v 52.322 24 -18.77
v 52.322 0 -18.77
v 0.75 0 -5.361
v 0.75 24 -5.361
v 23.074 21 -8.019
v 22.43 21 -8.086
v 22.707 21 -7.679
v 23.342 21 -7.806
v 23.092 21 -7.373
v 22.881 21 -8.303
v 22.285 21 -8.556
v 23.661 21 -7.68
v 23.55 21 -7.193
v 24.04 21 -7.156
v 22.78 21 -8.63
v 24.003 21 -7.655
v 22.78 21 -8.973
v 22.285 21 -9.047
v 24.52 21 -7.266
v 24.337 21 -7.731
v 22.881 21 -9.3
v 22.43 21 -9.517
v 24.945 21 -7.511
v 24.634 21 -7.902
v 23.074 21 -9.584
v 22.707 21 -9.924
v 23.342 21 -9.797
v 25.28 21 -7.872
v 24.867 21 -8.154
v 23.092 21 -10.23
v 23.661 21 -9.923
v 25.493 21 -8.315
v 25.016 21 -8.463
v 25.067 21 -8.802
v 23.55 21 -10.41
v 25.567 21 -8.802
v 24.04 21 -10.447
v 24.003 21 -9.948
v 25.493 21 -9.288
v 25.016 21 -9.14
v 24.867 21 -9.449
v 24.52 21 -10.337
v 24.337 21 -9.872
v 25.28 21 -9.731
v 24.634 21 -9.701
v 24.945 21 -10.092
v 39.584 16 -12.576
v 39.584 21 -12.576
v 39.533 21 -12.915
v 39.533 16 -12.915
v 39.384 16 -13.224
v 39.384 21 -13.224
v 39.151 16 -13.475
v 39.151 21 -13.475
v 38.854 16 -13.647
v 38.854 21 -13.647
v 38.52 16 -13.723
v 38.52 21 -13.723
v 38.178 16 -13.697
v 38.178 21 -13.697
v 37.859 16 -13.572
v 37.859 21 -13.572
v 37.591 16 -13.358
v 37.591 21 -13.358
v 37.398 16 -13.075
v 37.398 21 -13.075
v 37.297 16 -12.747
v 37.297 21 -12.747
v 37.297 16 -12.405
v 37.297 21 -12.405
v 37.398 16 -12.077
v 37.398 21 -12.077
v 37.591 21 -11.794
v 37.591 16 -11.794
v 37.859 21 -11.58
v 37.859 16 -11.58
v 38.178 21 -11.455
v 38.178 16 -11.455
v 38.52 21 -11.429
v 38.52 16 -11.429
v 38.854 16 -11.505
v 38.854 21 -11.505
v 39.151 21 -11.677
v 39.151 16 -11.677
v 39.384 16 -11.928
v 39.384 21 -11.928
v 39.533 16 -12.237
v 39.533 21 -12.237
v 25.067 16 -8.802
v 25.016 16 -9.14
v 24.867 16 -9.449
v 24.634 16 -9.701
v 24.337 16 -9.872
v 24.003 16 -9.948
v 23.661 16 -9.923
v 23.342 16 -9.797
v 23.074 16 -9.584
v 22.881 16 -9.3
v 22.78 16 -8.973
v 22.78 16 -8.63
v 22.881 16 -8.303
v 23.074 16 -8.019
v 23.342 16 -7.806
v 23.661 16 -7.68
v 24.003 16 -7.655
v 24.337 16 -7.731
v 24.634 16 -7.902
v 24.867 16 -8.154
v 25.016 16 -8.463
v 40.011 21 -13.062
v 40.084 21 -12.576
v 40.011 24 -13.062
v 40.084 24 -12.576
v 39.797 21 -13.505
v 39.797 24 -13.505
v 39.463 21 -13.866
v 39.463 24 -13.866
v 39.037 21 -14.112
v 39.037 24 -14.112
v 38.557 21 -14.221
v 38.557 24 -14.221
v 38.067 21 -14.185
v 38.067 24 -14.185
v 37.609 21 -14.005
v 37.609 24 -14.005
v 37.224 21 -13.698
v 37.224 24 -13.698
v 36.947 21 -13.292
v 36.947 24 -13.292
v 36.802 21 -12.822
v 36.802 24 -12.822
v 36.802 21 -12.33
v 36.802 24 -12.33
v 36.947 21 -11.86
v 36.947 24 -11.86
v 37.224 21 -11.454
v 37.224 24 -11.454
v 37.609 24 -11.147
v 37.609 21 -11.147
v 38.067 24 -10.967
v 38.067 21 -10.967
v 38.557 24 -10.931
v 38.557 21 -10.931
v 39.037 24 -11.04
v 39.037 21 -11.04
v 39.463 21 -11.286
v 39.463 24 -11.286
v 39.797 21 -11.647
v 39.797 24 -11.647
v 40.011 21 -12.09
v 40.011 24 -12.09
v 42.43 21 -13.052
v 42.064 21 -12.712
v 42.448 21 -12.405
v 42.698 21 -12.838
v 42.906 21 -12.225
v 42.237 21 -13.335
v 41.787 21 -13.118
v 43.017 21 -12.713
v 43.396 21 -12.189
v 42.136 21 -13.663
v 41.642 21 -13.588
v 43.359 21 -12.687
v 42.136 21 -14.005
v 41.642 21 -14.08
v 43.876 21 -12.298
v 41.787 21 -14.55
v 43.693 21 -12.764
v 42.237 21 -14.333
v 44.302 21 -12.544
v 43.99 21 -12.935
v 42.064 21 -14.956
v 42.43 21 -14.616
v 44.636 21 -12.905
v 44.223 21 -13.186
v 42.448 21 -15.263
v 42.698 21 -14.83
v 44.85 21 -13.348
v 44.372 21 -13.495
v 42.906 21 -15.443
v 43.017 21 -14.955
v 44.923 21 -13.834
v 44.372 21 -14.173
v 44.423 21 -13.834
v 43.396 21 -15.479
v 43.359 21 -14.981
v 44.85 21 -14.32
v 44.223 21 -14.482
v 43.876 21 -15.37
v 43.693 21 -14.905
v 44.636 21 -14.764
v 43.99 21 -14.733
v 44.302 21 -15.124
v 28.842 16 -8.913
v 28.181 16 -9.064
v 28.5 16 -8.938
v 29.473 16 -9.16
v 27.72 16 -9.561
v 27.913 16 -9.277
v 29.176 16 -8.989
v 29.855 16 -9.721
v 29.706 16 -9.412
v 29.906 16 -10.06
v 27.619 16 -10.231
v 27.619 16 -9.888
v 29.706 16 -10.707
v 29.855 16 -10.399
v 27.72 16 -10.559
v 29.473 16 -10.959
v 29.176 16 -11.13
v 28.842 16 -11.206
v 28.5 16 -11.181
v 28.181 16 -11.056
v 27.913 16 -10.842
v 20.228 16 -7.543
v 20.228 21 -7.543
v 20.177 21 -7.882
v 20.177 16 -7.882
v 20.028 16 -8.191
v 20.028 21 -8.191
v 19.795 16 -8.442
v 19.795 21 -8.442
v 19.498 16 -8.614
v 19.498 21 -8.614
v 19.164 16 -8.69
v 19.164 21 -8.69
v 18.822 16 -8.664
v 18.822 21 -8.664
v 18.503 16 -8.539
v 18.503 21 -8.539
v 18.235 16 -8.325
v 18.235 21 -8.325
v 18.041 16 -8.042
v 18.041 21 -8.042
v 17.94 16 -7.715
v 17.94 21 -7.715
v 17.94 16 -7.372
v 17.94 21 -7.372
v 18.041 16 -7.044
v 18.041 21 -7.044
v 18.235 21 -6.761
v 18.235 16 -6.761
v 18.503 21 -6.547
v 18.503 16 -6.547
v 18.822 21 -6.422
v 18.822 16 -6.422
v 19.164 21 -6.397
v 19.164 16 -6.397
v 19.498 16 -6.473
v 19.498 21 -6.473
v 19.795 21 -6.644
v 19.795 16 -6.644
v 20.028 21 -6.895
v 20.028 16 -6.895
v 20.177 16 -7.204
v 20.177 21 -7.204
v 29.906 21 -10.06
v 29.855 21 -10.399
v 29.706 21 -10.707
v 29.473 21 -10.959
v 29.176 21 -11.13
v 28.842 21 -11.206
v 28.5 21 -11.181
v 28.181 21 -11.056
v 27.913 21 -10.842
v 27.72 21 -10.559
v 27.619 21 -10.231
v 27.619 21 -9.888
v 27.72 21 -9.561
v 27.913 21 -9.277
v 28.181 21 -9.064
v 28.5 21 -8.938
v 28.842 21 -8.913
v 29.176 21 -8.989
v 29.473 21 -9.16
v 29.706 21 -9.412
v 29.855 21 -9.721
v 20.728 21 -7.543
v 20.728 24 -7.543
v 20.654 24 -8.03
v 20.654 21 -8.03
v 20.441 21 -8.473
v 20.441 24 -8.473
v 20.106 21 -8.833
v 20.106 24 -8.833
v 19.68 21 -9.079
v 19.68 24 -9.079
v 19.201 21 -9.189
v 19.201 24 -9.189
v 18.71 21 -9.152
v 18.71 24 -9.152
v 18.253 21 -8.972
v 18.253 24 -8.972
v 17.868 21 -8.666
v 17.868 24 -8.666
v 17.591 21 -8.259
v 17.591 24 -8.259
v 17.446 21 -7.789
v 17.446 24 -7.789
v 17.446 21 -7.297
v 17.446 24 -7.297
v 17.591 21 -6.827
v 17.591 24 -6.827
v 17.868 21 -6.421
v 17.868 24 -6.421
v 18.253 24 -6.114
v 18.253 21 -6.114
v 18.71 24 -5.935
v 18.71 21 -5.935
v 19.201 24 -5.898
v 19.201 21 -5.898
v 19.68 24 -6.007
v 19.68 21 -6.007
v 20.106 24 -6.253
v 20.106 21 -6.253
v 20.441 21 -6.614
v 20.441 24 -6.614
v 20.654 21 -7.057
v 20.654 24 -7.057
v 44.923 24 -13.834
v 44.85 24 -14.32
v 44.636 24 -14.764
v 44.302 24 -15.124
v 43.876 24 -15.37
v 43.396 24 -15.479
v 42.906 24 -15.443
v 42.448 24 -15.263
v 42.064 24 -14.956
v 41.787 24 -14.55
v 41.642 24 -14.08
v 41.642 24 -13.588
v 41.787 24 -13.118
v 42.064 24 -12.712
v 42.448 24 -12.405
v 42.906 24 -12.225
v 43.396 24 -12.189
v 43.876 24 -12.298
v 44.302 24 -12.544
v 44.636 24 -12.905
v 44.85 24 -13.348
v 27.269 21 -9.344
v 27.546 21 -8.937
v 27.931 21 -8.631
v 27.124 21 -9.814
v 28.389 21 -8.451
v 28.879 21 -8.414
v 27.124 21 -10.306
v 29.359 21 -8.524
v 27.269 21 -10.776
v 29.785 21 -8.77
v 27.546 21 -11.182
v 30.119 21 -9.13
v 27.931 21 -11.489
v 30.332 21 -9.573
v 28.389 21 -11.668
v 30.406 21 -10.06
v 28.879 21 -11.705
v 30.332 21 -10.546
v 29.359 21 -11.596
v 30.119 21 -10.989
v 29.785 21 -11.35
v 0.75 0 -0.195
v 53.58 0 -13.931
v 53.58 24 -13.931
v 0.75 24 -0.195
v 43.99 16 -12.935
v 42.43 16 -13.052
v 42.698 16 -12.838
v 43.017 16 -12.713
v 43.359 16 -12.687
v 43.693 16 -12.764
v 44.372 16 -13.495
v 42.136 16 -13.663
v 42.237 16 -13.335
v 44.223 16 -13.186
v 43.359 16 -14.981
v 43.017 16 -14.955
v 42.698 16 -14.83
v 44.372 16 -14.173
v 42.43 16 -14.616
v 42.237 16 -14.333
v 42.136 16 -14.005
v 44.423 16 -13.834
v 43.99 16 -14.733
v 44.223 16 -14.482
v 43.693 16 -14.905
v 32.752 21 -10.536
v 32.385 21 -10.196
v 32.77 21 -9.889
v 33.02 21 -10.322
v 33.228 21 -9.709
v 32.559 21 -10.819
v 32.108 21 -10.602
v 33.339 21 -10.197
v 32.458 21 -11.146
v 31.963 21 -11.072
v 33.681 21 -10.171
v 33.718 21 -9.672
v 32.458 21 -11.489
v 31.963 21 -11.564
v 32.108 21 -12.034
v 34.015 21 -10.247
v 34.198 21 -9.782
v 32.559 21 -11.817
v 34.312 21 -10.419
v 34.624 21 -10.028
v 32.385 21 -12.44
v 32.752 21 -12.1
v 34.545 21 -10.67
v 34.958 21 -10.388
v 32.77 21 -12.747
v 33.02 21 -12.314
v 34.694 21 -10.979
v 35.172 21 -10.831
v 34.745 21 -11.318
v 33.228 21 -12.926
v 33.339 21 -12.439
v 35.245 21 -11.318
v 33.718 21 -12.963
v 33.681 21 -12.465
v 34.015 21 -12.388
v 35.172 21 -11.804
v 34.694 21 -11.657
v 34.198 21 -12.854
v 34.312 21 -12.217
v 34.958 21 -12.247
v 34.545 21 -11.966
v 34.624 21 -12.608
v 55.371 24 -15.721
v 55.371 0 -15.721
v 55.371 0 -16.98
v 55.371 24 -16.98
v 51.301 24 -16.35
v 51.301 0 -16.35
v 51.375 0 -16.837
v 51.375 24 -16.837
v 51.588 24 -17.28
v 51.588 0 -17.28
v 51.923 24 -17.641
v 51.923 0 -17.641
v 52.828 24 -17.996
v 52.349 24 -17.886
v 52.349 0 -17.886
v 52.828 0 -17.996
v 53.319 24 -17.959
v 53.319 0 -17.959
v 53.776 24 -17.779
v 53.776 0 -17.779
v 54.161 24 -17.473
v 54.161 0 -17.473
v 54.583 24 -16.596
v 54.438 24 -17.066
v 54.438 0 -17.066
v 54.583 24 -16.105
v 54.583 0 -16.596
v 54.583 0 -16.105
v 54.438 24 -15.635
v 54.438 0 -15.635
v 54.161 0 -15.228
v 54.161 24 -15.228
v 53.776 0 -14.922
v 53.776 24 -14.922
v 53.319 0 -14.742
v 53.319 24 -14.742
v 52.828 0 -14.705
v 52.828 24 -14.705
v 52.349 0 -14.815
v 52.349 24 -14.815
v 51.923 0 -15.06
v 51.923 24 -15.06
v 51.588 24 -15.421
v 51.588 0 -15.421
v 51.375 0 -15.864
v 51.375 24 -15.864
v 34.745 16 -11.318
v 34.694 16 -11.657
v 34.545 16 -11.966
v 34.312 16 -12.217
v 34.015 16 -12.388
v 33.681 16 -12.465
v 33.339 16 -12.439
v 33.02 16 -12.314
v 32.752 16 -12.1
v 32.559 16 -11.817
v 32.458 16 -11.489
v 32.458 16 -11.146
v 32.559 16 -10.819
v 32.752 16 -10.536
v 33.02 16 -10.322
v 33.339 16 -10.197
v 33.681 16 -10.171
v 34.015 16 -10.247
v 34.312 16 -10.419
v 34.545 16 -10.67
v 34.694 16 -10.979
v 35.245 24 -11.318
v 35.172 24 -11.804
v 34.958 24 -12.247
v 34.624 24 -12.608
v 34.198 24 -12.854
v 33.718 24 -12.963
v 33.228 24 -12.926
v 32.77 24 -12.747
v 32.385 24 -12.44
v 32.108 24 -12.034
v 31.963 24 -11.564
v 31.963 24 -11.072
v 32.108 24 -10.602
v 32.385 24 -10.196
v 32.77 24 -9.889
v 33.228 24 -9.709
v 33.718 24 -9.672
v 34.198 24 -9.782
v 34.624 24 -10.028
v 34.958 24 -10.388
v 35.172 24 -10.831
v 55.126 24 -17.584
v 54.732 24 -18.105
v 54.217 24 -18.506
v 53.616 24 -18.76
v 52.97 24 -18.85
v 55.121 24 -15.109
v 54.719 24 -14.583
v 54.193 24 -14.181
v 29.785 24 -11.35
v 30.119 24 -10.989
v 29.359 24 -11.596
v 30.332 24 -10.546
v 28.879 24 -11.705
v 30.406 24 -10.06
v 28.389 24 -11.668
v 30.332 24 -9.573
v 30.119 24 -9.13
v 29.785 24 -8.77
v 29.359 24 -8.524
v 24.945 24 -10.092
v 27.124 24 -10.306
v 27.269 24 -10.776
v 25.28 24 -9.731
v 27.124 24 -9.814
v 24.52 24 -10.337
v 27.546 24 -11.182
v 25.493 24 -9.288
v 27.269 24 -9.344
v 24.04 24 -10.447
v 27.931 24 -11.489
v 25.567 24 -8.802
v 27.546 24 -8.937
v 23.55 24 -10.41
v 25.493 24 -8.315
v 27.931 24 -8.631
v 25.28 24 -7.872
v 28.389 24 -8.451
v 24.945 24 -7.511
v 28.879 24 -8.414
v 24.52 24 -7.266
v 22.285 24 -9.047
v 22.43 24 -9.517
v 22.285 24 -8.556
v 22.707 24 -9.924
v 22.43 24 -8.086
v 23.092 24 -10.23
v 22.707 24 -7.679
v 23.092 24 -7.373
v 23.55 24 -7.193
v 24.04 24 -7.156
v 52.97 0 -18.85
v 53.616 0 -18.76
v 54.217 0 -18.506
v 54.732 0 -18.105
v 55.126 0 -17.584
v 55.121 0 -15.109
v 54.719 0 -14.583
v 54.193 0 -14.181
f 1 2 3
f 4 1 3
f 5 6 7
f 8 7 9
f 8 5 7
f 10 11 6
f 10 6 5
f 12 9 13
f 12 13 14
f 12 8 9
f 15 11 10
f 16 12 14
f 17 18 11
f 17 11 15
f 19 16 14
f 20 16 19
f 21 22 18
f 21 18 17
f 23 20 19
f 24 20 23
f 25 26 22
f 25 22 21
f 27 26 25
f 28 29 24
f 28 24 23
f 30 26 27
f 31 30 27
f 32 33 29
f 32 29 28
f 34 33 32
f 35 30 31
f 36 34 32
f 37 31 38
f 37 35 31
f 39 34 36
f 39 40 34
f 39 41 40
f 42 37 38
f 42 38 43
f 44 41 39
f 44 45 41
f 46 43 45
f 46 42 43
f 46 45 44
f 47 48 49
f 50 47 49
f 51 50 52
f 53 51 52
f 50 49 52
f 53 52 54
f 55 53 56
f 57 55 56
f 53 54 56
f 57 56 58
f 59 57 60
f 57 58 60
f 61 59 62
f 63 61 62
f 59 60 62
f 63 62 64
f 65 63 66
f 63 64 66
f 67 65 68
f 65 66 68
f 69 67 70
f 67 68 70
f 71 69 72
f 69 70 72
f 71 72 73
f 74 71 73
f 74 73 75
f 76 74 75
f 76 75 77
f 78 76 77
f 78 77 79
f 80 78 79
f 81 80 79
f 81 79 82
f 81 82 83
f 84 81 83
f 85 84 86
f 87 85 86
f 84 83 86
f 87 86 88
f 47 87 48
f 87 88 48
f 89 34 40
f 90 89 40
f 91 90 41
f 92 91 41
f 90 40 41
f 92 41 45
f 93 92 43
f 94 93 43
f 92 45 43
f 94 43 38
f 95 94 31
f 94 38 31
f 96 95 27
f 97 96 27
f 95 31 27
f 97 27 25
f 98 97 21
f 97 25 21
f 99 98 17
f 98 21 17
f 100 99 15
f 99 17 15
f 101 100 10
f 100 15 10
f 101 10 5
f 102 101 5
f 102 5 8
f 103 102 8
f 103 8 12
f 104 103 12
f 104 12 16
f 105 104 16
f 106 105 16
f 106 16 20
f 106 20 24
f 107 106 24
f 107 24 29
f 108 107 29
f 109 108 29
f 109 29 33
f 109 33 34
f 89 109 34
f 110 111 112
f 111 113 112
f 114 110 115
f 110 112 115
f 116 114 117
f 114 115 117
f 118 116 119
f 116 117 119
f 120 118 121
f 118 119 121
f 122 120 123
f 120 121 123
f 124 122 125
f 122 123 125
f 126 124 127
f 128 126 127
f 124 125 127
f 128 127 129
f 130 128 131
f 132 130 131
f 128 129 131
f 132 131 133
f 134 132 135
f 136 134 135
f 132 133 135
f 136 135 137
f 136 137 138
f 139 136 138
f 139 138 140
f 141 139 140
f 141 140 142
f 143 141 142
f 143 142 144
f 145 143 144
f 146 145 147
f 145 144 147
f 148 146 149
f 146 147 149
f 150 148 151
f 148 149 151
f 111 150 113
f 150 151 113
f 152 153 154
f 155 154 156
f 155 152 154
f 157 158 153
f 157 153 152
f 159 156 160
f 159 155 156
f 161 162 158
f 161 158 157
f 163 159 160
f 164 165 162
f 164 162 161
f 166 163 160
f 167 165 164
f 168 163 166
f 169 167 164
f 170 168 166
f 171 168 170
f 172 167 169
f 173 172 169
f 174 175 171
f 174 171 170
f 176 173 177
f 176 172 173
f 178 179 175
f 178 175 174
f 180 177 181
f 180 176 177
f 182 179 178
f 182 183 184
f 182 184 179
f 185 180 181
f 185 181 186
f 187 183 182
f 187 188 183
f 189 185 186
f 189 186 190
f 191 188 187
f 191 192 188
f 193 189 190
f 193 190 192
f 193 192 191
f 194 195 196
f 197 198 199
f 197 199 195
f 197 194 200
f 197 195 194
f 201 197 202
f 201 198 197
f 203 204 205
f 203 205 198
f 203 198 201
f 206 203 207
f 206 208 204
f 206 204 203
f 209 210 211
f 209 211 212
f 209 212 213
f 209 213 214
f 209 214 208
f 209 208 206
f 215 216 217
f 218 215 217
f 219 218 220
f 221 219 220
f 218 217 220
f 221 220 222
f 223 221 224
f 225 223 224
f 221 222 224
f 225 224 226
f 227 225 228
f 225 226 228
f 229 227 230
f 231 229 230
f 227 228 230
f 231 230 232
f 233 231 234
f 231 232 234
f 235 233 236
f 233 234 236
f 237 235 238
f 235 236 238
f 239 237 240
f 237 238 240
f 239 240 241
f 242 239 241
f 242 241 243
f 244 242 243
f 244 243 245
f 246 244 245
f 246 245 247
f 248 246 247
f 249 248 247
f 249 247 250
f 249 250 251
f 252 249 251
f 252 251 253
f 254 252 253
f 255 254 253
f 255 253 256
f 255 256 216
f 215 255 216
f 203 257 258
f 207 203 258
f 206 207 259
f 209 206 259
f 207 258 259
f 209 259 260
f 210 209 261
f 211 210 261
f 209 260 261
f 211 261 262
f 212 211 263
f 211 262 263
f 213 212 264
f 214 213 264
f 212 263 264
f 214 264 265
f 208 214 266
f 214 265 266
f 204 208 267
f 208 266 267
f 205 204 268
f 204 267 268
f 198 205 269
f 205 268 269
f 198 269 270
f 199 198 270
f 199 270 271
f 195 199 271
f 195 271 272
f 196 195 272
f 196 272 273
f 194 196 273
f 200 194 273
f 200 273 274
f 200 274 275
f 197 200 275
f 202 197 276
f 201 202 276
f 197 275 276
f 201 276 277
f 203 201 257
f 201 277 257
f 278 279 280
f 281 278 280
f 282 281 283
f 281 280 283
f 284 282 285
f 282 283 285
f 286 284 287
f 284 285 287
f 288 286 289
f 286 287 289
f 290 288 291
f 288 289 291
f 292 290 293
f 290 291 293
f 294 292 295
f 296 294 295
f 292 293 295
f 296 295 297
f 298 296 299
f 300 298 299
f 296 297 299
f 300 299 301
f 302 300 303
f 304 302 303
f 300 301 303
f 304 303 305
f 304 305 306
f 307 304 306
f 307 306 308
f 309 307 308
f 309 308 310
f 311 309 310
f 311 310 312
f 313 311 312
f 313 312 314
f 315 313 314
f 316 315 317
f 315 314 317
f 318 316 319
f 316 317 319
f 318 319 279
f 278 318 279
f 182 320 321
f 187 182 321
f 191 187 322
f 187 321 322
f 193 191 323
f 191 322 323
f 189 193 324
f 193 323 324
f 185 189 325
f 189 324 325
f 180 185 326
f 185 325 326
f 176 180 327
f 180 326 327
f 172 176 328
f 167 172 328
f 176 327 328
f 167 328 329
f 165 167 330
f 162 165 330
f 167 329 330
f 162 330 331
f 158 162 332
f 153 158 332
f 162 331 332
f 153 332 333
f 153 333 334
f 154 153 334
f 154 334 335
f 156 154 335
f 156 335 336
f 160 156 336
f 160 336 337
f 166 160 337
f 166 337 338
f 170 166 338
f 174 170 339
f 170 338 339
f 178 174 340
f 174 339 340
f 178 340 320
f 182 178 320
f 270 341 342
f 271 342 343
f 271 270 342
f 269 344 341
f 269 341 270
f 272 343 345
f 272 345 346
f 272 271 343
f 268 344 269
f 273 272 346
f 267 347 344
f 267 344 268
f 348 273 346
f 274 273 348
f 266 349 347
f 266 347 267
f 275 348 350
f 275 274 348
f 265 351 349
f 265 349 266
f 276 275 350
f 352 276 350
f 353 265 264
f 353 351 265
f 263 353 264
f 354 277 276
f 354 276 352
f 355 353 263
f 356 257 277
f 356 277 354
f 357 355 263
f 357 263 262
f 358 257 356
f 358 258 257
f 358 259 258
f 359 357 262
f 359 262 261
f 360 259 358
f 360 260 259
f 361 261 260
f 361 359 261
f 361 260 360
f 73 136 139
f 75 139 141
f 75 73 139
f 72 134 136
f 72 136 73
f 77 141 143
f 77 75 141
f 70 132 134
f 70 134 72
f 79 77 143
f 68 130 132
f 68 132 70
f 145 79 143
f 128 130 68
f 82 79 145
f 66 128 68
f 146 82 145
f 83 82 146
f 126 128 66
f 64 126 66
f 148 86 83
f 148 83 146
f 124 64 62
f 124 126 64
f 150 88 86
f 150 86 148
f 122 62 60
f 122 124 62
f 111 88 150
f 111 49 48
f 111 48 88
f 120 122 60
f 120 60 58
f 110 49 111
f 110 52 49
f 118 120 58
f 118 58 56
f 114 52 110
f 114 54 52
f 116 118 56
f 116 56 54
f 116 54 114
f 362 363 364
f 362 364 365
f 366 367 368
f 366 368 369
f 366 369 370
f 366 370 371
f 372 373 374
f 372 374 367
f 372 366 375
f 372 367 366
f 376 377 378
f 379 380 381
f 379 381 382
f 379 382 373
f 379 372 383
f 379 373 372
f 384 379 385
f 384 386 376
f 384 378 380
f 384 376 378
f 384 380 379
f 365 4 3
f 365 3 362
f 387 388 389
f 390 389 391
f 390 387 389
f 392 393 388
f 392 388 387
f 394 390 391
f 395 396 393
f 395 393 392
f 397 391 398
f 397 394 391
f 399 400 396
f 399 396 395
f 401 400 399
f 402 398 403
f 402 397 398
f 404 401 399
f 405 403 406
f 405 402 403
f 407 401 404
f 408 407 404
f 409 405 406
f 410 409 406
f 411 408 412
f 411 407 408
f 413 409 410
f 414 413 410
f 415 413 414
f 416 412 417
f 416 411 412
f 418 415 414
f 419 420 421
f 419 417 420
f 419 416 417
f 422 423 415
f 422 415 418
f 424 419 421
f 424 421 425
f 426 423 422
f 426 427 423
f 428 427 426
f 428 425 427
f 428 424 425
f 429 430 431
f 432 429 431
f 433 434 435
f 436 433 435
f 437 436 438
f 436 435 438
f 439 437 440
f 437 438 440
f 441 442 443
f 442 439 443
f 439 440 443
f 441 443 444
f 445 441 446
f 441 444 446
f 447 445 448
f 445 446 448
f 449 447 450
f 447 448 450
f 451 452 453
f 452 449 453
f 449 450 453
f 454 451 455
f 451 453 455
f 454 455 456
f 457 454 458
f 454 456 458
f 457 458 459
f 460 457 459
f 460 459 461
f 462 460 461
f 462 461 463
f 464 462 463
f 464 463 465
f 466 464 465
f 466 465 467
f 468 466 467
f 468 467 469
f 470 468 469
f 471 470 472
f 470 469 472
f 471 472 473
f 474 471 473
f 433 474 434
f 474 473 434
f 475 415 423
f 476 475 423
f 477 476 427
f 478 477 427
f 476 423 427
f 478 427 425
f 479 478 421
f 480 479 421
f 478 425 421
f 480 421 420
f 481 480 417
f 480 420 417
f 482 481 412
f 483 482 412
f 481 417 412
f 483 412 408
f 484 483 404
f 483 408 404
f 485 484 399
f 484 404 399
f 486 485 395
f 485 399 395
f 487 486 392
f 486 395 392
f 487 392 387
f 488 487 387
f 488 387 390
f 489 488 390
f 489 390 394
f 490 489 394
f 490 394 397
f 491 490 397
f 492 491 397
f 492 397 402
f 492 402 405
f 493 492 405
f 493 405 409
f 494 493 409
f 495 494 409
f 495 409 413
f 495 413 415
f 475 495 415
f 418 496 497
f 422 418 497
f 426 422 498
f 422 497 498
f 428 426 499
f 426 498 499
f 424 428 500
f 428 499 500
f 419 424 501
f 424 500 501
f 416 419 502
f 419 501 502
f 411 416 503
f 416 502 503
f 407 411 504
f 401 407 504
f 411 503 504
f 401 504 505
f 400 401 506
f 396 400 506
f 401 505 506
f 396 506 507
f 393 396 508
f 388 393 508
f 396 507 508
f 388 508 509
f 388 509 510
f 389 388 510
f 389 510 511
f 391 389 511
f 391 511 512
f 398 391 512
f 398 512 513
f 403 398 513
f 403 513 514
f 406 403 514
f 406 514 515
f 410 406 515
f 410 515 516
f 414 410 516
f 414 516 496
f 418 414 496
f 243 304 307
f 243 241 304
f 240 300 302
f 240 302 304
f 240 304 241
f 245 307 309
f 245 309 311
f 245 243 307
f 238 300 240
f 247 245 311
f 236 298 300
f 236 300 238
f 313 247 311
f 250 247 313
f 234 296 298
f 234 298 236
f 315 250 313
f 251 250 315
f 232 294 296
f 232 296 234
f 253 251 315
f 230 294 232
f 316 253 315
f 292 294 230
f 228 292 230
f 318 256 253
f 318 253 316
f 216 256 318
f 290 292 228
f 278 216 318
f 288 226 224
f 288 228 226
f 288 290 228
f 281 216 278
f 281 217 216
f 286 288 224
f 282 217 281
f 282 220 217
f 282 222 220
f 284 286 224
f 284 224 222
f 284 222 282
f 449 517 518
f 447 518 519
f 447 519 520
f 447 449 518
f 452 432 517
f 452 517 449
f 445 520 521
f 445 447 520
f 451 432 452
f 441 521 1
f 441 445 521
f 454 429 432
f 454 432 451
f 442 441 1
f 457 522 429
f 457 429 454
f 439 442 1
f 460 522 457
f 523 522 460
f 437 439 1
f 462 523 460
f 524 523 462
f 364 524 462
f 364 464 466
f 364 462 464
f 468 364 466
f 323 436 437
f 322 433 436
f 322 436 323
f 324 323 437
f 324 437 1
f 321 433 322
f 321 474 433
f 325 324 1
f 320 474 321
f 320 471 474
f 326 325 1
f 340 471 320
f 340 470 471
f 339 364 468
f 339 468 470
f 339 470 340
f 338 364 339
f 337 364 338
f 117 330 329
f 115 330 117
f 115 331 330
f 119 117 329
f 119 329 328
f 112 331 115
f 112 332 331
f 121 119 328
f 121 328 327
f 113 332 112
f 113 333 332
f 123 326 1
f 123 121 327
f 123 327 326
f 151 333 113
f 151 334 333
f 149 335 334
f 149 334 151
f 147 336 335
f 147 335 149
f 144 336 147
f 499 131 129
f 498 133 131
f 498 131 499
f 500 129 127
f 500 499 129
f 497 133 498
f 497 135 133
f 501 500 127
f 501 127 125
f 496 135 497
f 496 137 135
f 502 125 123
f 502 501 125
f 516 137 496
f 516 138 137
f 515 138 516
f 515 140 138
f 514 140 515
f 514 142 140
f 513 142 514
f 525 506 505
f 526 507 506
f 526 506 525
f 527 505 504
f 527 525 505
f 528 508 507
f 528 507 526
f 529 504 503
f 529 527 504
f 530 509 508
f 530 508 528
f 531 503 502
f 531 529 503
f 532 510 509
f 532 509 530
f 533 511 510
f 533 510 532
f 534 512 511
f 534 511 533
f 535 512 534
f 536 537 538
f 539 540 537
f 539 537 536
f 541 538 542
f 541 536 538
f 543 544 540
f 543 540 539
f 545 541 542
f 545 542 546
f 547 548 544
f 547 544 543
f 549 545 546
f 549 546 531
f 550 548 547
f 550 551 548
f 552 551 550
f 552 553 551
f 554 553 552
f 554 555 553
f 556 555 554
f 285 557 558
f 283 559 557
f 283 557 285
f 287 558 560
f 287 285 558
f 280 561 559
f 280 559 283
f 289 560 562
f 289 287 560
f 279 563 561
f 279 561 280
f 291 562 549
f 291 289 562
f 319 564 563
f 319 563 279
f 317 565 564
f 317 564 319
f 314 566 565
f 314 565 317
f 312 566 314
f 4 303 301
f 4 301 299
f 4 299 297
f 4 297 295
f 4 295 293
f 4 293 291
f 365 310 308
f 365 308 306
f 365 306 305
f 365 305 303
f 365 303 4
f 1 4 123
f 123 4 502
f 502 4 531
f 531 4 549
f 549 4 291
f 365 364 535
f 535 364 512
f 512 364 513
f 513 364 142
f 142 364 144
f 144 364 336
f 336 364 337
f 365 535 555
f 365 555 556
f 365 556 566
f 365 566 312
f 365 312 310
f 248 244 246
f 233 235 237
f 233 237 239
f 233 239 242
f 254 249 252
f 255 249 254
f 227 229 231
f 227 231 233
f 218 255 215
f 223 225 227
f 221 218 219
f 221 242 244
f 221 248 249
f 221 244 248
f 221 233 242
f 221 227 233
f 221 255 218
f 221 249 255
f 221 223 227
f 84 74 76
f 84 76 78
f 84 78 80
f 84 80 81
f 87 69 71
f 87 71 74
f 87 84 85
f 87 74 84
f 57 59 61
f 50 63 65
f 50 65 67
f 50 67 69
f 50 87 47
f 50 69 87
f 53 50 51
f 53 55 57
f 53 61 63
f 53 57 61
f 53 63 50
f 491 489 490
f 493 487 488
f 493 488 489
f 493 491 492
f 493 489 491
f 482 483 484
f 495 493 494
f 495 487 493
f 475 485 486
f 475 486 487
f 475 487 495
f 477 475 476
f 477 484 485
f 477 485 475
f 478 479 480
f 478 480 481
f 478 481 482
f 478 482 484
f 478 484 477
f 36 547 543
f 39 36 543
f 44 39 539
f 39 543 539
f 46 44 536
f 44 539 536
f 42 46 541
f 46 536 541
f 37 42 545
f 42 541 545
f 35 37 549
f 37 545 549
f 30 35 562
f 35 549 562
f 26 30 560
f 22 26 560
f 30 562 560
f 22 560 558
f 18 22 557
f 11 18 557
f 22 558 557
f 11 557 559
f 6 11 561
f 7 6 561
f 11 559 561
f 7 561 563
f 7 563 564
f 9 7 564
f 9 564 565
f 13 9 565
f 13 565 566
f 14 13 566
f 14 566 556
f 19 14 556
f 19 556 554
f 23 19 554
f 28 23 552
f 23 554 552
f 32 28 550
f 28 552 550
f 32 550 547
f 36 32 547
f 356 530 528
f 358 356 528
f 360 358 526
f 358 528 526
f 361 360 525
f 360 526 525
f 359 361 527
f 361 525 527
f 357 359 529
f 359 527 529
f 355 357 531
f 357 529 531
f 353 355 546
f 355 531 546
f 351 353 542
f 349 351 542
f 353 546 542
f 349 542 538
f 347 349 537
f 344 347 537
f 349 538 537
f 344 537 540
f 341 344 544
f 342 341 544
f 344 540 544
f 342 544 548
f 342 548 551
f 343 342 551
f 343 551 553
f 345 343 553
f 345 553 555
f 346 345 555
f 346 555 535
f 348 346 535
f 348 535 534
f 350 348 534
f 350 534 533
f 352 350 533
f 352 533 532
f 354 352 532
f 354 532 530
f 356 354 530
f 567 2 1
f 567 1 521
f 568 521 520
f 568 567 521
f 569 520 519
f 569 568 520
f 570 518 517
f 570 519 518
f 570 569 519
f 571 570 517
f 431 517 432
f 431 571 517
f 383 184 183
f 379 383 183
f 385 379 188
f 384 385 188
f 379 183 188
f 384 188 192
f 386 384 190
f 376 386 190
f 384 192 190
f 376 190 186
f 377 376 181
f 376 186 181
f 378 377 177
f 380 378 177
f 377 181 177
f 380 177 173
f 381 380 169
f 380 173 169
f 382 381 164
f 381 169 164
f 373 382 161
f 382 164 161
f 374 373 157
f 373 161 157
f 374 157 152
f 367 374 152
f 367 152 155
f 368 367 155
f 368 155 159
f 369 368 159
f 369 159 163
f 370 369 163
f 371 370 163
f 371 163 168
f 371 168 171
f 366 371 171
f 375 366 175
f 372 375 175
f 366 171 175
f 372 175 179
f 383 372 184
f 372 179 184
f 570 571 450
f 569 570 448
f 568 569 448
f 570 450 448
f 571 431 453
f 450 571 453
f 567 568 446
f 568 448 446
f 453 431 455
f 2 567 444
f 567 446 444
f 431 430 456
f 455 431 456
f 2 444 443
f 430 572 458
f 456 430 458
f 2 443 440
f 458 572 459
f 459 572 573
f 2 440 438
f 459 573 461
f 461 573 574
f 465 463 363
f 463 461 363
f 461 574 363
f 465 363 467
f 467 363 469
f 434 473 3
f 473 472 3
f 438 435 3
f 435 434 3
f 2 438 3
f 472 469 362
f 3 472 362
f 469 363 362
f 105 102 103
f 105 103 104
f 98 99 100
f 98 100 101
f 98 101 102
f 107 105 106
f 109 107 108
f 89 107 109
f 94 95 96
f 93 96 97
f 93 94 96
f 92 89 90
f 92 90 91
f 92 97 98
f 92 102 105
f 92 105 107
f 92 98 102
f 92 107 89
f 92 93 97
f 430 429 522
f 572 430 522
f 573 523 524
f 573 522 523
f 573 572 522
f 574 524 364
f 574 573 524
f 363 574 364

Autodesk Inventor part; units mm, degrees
ref_plane "YZ Plane" through (0, 0, 0) normal (1, 0, 0) x (0, 1, 0)
ref_plane "XZ Plane" through (0, 0, 0) normal (0, 1, 0) x (-1, 0, 0)
ref_plane "XY Plane" through (0, 0, 0) normal (0, 0, 1) x (1, 0, 0)
sketch "Эскиз1" plane through (0, 0, 0) normal (0, 1, 0) x (-1, 0, 0)
  line L0 (-53.5804, -13.9309) -> (-0.75, -0.195)
  line L1 (-52.3223, -18.77) -> (-0.75, -5.3612)
  line L2 (-55.3709, -15.7214) -> (-55.3709, -16.9796)
  circle A0 centre (-52.9514, -16.3505) radius 1.65
  line L3 (-0.75, -5.3612) -> (-0.75, -0.195)
  arc A1 (-55.3709, -16.9796) -> (-52.3223, -18.77) centre (-52.9514, -16.3505) ccw
  arc A2 (-53.5804, -13.9309) -> (-55.3709, -15.7214) centre (-52.9514, -16.3505) ccw
  point P0 (0, 0)
extrude "Выдавливание1" add sketch "Эскиз1" along normal blind 24
sketch "Эскиз24" plane through (0, 24, 0) normal (0, 1, 0) x (1, 0, 0)
  circle A0 centre (52.9514, 16.3505) radius 1.65 projected
  line L0 (52.9514, 16.3505) -> (43.2731, 13.8341)
  circle A1 centre (43.2731, 13.8341) radius 1.65
  circle A2 centre (38.434, 12.576) radius 1.65
  line L1 (48.1122, 15.0923) -> (38.434, 12.576)
  circle A3 centre (33.5949, 11.3178) radius 1.65
  line L2 (43.2731, 13.8341) -> (33.5949, 11.3178)
  circle A4 centre (28.7558, 10.0596) radius 1.65
  line L3 (38.434, 12.576) -> (28.7558, 10.0596)
  circle A5 centre (23.9167, 8.8015) radius 1.65
  line L4 (33.5949, 11.3178) -> (23.9167, 8.8015)
  circle A6 centre (19.0776, 7.5433) radius 1.65
  line L5 (28.7558, 10.0596) -> (19.0776, 7.5433)
  point P0 (0, 0)
  dimension "d126" = 3.3
  dimension "d129" = 5
extrude "Выдавливание24" cut sketch "Эскиз24" against normal blind 3 contours A6 | A5 L5 L4 | L4 L5 A5 | A4 L4 L3 | L3 L4 A4 | A3 L3 L2 | L2 L3 A3 | A2 L2 L1 | L1 L2 A2 | A1 L1 L0 | L0 L1 A1
sketch "Эскиз25" plane through (19.0776, 21, -7.5433) normal (0, 1, 0) x (1, 0, 0)
  circle A0 centre (0, 0) radius 1.65 projected
  circle A1 centre (0, 0) radius 1.15
  circle A2 centre (4.8391, 1.2582) radius 1.65 projected
  circle A3 centre (4.8391, 1.2582) radius 1.15
  circle A4 centre (9.6782, 2.5163) radius 1.65 projected
  circle A5 centre (9.6782, 2.5163) radius 1.15
  circle A6 centre (14.5173, 3.7745) radius 1.65 projected
  circle A7 centre (14.5173, 3.7745) radius 1.15
  circle A8 centre (19.3565, 5.0327) radius 1.65 projected
  circle A9 centre (19.3565, 5.0327) radius 1.15
  circle A10 centre (24.1956, 6.2908) radius 1.65 projected
  circle A11 centre (24.1956, 6.2908) radius 1.15
  point P0 (-19.0776, -7.5433)
  dimension "d136" = 2.3
  dimension "d137" = 2.3
  dimension "d138" = 2.3
  dimension "d139" = 2.3
  dimension "d140" = 2.3
  dimension "d141" = 2.3
extrude "Выдавливание25" cut sketch "Эскиз25" against normal blind 5 contours A1 | A3 | A5 | A7 | A9 | A11
properties part number "only_top_gate"
